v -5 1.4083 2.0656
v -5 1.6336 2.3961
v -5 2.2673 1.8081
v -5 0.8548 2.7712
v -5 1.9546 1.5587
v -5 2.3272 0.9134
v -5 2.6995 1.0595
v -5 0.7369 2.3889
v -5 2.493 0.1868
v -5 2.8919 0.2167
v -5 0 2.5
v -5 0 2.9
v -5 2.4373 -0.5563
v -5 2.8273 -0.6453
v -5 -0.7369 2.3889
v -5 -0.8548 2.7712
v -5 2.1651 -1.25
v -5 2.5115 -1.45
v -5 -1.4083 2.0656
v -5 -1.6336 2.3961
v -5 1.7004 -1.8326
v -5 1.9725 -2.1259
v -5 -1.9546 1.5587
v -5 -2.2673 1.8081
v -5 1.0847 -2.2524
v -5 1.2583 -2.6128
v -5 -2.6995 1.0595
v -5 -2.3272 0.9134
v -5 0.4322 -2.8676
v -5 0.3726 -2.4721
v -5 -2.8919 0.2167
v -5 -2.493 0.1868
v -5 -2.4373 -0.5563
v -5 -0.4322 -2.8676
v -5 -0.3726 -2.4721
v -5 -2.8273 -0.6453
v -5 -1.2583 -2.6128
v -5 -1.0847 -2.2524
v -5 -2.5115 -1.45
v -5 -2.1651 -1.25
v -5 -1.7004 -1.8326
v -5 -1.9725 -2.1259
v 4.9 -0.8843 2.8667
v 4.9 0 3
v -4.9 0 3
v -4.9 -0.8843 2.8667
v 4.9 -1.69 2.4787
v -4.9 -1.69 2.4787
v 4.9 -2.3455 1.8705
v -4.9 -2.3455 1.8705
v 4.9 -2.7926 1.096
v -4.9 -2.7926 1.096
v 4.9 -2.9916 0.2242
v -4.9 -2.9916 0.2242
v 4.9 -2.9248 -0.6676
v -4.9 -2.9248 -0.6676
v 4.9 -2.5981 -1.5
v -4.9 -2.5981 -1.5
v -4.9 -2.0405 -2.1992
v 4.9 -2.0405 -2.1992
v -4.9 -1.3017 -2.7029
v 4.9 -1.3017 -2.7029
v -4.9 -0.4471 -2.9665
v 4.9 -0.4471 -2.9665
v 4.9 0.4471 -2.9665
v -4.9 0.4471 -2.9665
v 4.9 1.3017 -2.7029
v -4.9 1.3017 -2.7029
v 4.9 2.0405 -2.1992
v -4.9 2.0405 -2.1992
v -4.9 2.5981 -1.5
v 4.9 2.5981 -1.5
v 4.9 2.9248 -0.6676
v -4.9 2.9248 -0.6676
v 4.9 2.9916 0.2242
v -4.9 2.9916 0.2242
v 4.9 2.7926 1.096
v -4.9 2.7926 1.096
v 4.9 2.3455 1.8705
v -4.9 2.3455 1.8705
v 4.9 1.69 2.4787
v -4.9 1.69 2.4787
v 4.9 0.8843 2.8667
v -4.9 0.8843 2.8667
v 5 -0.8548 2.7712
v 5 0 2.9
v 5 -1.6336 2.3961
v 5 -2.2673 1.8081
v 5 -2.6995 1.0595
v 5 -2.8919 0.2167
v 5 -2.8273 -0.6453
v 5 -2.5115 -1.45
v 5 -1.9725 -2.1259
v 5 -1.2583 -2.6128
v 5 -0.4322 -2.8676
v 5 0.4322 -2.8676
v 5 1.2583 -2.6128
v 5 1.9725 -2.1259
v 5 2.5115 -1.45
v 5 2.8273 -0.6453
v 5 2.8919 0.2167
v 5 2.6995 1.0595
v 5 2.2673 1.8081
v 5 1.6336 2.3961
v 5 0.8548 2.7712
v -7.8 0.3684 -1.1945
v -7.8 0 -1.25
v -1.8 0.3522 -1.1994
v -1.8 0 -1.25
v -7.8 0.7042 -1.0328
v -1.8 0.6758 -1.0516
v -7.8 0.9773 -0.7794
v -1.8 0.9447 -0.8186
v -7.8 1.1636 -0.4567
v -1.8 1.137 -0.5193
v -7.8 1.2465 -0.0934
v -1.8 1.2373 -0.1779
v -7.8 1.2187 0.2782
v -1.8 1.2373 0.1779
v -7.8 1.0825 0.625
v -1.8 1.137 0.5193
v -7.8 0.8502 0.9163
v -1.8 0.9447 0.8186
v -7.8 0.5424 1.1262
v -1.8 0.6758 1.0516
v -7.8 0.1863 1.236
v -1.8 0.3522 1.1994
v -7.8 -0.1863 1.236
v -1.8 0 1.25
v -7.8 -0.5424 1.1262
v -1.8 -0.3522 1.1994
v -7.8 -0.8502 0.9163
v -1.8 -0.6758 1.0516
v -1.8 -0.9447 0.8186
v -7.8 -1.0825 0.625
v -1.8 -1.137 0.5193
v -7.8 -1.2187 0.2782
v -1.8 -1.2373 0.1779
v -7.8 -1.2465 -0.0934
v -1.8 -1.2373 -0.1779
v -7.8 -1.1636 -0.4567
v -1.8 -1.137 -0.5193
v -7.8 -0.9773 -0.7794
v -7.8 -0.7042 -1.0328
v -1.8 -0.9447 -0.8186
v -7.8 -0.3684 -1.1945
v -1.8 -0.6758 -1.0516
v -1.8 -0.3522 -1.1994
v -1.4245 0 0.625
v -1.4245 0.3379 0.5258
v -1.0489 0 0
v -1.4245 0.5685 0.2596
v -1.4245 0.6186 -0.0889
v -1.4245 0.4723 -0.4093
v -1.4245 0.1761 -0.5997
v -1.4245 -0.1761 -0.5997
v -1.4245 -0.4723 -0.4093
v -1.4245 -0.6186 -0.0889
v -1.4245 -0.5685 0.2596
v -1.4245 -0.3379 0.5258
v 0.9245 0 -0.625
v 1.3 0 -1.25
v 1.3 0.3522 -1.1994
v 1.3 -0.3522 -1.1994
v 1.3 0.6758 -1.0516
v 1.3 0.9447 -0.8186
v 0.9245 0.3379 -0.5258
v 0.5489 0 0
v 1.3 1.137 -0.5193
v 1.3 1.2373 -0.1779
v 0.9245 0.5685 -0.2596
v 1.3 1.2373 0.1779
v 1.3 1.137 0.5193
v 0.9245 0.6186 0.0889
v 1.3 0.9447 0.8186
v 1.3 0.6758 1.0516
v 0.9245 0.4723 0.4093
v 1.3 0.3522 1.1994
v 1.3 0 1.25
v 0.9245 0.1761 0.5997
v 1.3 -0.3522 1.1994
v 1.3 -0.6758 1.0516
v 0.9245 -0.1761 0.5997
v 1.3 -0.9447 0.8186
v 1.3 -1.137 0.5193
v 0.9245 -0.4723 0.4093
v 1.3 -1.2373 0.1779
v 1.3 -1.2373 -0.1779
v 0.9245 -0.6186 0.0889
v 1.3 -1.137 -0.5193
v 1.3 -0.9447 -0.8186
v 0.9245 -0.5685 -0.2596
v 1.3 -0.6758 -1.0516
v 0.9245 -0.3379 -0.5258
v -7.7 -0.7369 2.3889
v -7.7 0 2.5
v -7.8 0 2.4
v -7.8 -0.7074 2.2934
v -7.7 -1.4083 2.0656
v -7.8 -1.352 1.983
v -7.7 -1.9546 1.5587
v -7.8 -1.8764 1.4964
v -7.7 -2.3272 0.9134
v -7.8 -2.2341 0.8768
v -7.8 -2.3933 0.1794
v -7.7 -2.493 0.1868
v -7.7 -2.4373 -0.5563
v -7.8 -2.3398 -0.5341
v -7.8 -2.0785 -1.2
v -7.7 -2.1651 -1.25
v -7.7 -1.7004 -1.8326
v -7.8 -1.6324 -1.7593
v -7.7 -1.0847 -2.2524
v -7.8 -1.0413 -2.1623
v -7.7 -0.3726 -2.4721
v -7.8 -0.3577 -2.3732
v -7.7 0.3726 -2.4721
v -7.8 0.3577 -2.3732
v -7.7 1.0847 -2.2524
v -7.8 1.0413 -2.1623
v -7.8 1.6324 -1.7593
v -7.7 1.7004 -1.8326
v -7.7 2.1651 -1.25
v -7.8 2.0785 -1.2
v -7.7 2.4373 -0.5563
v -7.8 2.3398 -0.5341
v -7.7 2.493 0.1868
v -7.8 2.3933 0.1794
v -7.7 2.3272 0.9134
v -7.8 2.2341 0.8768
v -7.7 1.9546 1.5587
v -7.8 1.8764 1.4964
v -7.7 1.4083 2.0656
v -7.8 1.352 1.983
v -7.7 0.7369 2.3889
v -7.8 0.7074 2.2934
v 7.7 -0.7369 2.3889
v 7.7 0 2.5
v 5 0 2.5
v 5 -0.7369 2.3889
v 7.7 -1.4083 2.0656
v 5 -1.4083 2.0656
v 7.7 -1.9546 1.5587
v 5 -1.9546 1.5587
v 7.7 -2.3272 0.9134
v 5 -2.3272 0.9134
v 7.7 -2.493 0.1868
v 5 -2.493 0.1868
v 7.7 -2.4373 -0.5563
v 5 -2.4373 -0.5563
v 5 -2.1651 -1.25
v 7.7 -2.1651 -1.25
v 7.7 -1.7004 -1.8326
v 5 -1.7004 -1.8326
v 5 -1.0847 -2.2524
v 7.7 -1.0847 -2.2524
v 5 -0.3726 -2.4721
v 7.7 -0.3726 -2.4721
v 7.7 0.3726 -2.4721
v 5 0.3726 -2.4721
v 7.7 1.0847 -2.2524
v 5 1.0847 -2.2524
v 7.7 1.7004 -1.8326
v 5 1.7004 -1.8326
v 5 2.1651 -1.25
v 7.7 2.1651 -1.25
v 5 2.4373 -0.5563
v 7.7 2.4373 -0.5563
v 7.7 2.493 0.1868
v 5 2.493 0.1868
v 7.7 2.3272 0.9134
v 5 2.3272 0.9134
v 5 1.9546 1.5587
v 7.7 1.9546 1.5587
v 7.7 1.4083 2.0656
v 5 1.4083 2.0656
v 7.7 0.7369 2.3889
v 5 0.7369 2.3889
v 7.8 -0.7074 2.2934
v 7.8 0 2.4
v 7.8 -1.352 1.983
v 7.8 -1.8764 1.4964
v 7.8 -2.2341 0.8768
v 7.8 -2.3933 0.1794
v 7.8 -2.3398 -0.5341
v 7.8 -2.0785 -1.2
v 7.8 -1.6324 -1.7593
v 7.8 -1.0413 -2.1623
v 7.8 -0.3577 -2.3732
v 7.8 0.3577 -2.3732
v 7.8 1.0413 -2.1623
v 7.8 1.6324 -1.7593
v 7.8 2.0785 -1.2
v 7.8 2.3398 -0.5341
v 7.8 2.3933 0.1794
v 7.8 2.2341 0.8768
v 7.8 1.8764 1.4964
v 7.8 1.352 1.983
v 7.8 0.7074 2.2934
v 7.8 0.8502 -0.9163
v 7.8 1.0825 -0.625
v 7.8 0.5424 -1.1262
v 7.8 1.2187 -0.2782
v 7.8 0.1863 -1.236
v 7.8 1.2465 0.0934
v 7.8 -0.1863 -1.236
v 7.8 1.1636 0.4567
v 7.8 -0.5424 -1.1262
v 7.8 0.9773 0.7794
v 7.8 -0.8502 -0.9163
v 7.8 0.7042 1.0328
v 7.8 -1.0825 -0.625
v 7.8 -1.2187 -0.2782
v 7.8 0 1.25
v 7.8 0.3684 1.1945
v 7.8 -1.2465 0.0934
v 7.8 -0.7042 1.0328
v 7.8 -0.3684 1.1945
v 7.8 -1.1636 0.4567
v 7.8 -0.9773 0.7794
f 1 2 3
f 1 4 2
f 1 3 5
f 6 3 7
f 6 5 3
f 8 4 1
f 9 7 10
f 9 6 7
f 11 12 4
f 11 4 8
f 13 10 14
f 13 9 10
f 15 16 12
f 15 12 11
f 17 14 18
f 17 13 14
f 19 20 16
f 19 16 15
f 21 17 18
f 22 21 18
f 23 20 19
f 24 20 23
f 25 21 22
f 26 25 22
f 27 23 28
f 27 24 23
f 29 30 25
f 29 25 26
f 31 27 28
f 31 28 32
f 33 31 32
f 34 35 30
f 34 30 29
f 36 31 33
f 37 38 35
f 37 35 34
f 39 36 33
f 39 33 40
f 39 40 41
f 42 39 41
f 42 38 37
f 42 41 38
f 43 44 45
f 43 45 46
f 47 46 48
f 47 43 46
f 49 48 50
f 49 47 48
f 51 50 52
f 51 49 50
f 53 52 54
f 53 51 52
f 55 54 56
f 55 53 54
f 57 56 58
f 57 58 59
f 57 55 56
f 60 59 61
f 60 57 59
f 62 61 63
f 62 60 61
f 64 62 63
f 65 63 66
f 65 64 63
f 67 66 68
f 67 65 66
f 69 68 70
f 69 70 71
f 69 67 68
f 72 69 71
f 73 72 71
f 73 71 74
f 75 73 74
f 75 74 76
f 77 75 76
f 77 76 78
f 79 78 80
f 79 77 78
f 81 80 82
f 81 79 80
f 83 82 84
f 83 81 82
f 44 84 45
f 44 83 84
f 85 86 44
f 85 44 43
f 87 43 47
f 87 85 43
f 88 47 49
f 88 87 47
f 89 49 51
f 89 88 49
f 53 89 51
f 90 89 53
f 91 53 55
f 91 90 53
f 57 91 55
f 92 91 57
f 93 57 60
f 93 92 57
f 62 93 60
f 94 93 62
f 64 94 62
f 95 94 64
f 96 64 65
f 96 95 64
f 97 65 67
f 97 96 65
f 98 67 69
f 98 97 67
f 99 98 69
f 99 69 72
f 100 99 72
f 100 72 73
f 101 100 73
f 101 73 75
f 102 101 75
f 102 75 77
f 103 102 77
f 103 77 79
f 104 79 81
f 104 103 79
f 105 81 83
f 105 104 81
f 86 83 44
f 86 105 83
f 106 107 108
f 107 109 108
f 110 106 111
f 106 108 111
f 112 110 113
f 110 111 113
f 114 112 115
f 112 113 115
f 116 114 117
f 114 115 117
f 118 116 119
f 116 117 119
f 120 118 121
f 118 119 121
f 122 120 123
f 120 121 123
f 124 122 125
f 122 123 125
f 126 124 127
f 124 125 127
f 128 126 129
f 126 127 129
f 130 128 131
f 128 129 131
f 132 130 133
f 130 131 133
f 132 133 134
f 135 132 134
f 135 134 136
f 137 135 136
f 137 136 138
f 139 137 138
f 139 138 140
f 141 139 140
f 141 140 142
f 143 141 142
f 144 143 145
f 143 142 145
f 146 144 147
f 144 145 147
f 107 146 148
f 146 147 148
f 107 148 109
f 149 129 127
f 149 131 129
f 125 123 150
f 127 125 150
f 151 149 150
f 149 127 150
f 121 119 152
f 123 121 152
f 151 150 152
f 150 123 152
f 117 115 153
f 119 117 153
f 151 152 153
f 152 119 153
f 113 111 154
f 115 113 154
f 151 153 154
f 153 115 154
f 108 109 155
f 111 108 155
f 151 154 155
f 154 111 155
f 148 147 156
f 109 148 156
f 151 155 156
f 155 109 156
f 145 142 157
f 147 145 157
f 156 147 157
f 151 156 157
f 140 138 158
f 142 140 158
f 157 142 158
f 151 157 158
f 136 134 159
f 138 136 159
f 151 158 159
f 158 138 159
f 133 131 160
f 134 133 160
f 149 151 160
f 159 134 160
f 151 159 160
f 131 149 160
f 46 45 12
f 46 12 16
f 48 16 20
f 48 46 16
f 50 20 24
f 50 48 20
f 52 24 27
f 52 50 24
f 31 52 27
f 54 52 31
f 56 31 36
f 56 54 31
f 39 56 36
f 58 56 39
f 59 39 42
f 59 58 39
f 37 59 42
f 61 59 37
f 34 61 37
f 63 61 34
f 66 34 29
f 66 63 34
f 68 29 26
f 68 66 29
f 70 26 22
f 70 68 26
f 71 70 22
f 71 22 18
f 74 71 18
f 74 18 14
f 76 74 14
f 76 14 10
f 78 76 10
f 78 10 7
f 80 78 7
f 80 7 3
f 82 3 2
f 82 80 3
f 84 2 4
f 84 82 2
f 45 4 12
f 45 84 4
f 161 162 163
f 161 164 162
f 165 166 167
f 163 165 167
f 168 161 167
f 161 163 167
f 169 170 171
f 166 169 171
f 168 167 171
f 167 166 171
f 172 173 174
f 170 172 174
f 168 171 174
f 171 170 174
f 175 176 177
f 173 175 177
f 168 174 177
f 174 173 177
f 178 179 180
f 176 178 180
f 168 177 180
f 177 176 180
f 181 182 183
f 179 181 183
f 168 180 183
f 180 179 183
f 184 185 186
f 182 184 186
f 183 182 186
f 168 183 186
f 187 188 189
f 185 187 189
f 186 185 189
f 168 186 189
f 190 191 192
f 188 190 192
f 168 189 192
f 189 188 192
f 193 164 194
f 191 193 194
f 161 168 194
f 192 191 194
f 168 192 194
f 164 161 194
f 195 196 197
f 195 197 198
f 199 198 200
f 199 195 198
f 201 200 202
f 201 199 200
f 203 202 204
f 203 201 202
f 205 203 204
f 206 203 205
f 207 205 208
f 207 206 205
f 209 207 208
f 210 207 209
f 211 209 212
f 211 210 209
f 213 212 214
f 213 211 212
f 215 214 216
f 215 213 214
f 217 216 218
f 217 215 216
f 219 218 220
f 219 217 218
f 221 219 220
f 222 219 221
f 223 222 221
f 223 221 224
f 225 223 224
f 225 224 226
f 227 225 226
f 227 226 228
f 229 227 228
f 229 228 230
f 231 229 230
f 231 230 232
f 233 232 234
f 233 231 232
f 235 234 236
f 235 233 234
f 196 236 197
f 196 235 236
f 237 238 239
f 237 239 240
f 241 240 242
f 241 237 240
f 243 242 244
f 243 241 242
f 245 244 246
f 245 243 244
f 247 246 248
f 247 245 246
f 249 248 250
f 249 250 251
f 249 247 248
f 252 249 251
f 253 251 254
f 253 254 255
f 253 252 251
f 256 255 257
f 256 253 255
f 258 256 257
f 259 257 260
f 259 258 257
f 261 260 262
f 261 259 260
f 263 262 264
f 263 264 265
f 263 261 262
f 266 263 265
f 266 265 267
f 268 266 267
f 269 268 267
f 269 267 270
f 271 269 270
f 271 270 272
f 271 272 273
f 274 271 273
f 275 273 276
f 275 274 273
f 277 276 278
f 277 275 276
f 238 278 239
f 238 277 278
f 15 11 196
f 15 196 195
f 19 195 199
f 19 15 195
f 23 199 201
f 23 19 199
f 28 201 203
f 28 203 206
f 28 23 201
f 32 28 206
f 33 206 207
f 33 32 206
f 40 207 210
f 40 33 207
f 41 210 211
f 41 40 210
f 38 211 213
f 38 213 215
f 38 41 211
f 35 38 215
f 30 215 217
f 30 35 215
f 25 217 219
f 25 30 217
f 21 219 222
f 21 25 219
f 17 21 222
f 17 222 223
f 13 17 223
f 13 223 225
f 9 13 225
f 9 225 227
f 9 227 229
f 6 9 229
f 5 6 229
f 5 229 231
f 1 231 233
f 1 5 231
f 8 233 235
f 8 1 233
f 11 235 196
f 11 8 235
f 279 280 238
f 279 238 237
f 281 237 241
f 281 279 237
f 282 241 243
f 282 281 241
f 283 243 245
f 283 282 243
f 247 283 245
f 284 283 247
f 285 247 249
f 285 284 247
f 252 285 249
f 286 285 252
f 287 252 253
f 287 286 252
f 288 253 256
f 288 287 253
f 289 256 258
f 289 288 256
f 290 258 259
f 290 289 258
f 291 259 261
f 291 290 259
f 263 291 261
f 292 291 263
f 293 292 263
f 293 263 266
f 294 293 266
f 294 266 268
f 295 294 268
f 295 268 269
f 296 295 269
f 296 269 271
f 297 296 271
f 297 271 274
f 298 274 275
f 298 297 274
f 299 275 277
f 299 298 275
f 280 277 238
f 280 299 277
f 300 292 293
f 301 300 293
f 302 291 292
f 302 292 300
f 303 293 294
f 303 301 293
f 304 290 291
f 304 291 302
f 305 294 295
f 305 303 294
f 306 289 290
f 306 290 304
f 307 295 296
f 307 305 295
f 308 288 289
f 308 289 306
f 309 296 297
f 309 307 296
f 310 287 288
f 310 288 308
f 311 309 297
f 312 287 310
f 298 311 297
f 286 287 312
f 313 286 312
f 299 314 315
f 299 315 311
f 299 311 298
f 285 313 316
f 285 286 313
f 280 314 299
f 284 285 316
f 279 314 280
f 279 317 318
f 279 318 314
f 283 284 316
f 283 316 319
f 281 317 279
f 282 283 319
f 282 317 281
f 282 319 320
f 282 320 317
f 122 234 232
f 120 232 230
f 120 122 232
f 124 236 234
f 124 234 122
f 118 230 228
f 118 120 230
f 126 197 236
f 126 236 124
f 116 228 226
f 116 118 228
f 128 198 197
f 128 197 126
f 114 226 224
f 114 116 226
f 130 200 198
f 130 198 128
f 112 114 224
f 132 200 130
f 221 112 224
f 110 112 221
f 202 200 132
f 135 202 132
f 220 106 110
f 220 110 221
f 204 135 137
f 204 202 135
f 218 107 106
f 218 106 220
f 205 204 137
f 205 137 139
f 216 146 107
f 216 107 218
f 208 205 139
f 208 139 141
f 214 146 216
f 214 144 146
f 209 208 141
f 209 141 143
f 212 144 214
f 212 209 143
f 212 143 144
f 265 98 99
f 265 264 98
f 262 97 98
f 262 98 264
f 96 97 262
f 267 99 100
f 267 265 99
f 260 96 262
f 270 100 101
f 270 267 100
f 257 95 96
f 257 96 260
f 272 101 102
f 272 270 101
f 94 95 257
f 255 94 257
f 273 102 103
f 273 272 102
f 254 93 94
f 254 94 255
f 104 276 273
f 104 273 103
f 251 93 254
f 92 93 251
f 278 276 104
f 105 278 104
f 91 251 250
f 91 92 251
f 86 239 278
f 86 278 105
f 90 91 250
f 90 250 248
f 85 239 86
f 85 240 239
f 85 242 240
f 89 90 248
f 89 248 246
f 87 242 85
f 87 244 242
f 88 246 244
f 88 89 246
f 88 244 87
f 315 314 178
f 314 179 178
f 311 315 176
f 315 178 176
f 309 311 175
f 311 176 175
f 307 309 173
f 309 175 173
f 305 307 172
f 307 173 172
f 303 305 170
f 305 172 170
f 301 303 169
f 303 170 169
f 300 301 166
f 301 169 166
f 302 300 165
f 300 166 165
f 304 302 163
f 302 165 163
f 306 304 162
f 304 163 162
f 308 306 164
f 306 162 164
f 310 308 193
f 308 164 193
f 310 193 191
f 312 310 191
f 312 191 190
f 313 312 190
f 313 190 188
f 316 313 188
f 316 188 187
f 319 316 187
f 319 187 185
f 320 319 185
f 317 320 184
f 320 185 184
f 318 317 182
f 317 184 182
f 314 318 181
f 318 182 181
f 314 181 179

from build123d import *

# Parameters (mm, degrees)
HOLE_WIZARD_M3_2_D     = 2.5
HOLE_WIZARD_M3_2_DEPTH = 6
HOLE_WIZARD_M3_2_TIP   = 0.751075774
HOLE_WIZARD_M3_3_D     = 2.5
HOLE_WIZARD_M3_3_DEPTH = 6.5
HOLE_WIZARD_M3_3_TIP   = 0.751075774
CHAMFER_1_SIZE         = 0.1


with BuildPart() as part:
    # 草图2 → 旋转1 (revolve)
    with BuildSketch(Plane.XY, mode=Mode.PRIVATE) as revolve_1_sk:
        Polygon((-7.8, 0), (-7.8, 2.5), (-5, 2.5), (-5, 3), (5, 3), (5, 2.5), (7.8, 2.5), (7.8, 0), align=None)
    revolve(revolve_1_sk.sketch.rotate(Axis((-7.8, 0, 0), (1, 0, 0)), 90), axis=Axis((-7.8, 0, 0), (1, 0, 0)))

    # M3 螺纹孔2
    with Locations(Plane.ZY.offset(7.8)):
        with Locations((0, 0)):
            Hole(HOLE_WIZARD_M3_2_D / 2, depth=HOLE_WIZARD_M3_2_DEPTH)
            with Locations((0, 0, -(HOLE_WIZARD_M3_2_DEPTH + HOLE_WIZARD_M3_2_TIP / 2))):  # 118° drill point
                Cone(0, HOLE_WIZARD_M3_2_D / 2, HOLE_WIZARD_M3_2_TIP, mode=Mode.SUBTRACT)

    # M3 螺纹孔3
    with Locations(Plane(origin=(7.8, 0, 0), x_dir=(0, 0, -1), z_dir=(1, 0, 0))):
        with Locations((0, 0)):
            Hole(HOLE_WIZARD_M3_3_D / 2, depth=HOLE_WIZARD_M3_3_DEPTH)
            with Locations((0, 0, -(HOLE_WIZARD_M3_3_DEPTH + HOLE_WIZARD_M3_3_TIP / 2))):  # 118° drill point
                Cone(0, HOLE_WIZARD_M3_3_D / 2, HOLE_WIZARD_M3_3_TIP, mode=Mode.SUBTRACT)

    # 倒角1
    chamfer_1_edges = [part.edges().sort_by_distance(p)[0] for p in [
        (7.8, 0, -2.5),
        (5, 0, -3),
        (-5, 0, -3),
        (-7.8, 0, -2.5),
    ]]
    chamfer(chamfer_1_edges, length=CHAMFER_1_SIZE)


solid = part.part
